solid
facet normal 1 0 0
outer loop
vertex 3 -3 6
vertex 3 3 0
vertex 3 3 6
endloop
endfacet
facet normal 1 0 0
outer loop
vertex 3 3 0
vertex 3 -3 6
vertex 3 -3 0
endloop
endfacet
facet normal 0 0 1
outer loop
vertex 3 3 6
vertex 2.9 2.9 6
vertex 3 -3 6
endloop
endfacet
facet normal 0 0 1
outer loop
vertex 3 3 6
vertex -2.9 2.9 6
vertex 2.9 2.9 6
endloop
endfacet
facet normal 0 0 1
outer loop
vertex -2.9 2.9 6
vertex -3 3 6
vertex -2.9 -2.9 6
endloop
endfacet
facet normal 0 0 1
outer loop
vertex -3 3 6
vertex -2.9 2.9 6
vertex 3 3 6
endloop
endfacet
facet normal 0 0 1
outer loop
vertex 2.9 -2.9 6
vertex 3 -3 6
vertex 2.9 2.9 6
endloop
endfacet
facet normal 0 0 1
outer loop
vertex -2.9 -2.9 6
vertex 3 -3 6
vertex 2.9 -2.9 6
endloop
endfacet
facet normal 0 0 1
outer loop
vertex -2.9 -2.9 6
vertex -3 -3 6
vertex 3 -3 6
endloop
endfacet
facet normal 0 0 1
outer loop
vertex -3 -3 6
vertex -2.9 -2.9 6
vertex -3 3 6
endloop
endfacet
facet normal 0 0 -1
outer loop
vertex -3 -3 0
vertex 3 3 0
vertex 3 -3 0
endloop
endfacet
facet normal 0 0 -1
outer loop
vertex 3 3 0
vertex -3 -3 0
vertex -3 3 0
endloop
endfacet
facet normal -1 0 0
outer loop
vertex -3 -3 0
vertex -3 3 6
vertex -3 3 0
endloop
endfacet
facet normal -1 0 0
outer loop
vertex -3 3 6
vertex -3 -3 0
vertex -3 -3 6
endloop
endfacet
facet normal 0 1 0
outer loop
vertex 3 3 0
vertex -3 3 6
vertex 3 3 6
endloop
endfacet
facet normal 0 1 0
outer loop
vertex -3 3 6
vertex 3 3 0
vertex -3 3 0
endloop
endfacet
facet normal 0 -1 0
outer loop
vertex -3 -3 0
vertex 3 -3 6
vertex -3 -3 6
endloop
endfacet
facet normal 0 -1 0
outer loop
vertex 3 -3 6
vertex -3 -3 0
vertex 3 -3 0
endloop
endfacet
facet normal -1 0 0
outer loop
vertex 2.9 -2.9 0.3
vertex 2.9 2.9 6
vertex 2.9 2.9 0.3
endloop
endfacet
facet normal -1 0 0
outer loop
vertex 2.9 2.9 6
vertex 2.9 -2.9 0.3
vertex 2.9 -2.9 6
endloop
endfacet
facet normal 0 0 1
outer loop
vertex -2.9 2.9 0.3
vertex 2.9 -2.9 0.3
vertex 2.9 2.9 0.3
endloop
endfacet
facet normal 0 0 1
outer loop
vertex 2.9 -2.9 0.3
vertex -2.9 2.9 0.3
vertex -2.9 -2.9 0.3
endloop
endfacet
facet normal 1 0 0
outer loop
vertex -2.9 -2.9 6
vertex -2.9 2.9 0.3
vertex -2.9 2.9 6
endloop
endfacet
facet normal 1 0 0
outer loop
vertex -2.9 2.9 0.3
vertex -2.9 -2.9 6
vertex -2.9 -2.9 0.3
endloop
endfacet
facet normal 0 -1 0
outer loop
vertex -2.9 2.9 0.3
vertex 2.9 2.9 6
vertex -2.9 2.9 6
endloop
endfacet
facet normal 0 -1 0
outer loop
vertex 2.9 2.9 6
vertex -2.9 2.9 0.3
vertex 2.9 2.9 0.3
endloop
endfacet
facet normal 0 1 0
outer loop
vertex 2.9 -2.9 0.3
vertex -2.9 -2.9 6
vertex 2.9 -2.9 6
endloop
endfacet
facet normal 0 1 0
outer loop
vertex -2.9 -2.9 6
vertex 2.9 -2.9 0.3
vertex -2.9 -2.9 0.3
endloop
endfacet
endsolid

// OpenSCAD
//Générer un cube avec ouverture et mouvements
//Variables
afficher_cube = "o"; //o,n
rotation_360  = "x"; //x,y,z,f,n
mouvement_hauteur = "n";//o,n

x=6;
y=6;
z=6;

//Conditions
if(afficher_cube =="o")
{  
 if (rotation_360=="x") rotate([360*$t,0,0]) cube_ouvert();
 else if (rotation_360=="y") rotate([0,360*$t,0]) cube_ouvert(); 
 else if (rotation_360=="z") rotate([0,0,360*$t]) cube_ouvert();
 else if (rotation_360=="f") cube_ouvert();
 else{ }
 if(mouvement_hauteur=="o") translate([0,0,20]) translate([0,0,-20.3*$t]){cube_ouvert();}
}

//Modules cube
module cube_ouvert()
{
 difference()
 {   
  color("Cornsilk") translate([0,0,z/2]) cube([x,y,z],center=true); 
  translate([0,0,z/2+0.2]) cube([x-0.2,y-0.2,z-0.2],center=true); 
 }
} 
